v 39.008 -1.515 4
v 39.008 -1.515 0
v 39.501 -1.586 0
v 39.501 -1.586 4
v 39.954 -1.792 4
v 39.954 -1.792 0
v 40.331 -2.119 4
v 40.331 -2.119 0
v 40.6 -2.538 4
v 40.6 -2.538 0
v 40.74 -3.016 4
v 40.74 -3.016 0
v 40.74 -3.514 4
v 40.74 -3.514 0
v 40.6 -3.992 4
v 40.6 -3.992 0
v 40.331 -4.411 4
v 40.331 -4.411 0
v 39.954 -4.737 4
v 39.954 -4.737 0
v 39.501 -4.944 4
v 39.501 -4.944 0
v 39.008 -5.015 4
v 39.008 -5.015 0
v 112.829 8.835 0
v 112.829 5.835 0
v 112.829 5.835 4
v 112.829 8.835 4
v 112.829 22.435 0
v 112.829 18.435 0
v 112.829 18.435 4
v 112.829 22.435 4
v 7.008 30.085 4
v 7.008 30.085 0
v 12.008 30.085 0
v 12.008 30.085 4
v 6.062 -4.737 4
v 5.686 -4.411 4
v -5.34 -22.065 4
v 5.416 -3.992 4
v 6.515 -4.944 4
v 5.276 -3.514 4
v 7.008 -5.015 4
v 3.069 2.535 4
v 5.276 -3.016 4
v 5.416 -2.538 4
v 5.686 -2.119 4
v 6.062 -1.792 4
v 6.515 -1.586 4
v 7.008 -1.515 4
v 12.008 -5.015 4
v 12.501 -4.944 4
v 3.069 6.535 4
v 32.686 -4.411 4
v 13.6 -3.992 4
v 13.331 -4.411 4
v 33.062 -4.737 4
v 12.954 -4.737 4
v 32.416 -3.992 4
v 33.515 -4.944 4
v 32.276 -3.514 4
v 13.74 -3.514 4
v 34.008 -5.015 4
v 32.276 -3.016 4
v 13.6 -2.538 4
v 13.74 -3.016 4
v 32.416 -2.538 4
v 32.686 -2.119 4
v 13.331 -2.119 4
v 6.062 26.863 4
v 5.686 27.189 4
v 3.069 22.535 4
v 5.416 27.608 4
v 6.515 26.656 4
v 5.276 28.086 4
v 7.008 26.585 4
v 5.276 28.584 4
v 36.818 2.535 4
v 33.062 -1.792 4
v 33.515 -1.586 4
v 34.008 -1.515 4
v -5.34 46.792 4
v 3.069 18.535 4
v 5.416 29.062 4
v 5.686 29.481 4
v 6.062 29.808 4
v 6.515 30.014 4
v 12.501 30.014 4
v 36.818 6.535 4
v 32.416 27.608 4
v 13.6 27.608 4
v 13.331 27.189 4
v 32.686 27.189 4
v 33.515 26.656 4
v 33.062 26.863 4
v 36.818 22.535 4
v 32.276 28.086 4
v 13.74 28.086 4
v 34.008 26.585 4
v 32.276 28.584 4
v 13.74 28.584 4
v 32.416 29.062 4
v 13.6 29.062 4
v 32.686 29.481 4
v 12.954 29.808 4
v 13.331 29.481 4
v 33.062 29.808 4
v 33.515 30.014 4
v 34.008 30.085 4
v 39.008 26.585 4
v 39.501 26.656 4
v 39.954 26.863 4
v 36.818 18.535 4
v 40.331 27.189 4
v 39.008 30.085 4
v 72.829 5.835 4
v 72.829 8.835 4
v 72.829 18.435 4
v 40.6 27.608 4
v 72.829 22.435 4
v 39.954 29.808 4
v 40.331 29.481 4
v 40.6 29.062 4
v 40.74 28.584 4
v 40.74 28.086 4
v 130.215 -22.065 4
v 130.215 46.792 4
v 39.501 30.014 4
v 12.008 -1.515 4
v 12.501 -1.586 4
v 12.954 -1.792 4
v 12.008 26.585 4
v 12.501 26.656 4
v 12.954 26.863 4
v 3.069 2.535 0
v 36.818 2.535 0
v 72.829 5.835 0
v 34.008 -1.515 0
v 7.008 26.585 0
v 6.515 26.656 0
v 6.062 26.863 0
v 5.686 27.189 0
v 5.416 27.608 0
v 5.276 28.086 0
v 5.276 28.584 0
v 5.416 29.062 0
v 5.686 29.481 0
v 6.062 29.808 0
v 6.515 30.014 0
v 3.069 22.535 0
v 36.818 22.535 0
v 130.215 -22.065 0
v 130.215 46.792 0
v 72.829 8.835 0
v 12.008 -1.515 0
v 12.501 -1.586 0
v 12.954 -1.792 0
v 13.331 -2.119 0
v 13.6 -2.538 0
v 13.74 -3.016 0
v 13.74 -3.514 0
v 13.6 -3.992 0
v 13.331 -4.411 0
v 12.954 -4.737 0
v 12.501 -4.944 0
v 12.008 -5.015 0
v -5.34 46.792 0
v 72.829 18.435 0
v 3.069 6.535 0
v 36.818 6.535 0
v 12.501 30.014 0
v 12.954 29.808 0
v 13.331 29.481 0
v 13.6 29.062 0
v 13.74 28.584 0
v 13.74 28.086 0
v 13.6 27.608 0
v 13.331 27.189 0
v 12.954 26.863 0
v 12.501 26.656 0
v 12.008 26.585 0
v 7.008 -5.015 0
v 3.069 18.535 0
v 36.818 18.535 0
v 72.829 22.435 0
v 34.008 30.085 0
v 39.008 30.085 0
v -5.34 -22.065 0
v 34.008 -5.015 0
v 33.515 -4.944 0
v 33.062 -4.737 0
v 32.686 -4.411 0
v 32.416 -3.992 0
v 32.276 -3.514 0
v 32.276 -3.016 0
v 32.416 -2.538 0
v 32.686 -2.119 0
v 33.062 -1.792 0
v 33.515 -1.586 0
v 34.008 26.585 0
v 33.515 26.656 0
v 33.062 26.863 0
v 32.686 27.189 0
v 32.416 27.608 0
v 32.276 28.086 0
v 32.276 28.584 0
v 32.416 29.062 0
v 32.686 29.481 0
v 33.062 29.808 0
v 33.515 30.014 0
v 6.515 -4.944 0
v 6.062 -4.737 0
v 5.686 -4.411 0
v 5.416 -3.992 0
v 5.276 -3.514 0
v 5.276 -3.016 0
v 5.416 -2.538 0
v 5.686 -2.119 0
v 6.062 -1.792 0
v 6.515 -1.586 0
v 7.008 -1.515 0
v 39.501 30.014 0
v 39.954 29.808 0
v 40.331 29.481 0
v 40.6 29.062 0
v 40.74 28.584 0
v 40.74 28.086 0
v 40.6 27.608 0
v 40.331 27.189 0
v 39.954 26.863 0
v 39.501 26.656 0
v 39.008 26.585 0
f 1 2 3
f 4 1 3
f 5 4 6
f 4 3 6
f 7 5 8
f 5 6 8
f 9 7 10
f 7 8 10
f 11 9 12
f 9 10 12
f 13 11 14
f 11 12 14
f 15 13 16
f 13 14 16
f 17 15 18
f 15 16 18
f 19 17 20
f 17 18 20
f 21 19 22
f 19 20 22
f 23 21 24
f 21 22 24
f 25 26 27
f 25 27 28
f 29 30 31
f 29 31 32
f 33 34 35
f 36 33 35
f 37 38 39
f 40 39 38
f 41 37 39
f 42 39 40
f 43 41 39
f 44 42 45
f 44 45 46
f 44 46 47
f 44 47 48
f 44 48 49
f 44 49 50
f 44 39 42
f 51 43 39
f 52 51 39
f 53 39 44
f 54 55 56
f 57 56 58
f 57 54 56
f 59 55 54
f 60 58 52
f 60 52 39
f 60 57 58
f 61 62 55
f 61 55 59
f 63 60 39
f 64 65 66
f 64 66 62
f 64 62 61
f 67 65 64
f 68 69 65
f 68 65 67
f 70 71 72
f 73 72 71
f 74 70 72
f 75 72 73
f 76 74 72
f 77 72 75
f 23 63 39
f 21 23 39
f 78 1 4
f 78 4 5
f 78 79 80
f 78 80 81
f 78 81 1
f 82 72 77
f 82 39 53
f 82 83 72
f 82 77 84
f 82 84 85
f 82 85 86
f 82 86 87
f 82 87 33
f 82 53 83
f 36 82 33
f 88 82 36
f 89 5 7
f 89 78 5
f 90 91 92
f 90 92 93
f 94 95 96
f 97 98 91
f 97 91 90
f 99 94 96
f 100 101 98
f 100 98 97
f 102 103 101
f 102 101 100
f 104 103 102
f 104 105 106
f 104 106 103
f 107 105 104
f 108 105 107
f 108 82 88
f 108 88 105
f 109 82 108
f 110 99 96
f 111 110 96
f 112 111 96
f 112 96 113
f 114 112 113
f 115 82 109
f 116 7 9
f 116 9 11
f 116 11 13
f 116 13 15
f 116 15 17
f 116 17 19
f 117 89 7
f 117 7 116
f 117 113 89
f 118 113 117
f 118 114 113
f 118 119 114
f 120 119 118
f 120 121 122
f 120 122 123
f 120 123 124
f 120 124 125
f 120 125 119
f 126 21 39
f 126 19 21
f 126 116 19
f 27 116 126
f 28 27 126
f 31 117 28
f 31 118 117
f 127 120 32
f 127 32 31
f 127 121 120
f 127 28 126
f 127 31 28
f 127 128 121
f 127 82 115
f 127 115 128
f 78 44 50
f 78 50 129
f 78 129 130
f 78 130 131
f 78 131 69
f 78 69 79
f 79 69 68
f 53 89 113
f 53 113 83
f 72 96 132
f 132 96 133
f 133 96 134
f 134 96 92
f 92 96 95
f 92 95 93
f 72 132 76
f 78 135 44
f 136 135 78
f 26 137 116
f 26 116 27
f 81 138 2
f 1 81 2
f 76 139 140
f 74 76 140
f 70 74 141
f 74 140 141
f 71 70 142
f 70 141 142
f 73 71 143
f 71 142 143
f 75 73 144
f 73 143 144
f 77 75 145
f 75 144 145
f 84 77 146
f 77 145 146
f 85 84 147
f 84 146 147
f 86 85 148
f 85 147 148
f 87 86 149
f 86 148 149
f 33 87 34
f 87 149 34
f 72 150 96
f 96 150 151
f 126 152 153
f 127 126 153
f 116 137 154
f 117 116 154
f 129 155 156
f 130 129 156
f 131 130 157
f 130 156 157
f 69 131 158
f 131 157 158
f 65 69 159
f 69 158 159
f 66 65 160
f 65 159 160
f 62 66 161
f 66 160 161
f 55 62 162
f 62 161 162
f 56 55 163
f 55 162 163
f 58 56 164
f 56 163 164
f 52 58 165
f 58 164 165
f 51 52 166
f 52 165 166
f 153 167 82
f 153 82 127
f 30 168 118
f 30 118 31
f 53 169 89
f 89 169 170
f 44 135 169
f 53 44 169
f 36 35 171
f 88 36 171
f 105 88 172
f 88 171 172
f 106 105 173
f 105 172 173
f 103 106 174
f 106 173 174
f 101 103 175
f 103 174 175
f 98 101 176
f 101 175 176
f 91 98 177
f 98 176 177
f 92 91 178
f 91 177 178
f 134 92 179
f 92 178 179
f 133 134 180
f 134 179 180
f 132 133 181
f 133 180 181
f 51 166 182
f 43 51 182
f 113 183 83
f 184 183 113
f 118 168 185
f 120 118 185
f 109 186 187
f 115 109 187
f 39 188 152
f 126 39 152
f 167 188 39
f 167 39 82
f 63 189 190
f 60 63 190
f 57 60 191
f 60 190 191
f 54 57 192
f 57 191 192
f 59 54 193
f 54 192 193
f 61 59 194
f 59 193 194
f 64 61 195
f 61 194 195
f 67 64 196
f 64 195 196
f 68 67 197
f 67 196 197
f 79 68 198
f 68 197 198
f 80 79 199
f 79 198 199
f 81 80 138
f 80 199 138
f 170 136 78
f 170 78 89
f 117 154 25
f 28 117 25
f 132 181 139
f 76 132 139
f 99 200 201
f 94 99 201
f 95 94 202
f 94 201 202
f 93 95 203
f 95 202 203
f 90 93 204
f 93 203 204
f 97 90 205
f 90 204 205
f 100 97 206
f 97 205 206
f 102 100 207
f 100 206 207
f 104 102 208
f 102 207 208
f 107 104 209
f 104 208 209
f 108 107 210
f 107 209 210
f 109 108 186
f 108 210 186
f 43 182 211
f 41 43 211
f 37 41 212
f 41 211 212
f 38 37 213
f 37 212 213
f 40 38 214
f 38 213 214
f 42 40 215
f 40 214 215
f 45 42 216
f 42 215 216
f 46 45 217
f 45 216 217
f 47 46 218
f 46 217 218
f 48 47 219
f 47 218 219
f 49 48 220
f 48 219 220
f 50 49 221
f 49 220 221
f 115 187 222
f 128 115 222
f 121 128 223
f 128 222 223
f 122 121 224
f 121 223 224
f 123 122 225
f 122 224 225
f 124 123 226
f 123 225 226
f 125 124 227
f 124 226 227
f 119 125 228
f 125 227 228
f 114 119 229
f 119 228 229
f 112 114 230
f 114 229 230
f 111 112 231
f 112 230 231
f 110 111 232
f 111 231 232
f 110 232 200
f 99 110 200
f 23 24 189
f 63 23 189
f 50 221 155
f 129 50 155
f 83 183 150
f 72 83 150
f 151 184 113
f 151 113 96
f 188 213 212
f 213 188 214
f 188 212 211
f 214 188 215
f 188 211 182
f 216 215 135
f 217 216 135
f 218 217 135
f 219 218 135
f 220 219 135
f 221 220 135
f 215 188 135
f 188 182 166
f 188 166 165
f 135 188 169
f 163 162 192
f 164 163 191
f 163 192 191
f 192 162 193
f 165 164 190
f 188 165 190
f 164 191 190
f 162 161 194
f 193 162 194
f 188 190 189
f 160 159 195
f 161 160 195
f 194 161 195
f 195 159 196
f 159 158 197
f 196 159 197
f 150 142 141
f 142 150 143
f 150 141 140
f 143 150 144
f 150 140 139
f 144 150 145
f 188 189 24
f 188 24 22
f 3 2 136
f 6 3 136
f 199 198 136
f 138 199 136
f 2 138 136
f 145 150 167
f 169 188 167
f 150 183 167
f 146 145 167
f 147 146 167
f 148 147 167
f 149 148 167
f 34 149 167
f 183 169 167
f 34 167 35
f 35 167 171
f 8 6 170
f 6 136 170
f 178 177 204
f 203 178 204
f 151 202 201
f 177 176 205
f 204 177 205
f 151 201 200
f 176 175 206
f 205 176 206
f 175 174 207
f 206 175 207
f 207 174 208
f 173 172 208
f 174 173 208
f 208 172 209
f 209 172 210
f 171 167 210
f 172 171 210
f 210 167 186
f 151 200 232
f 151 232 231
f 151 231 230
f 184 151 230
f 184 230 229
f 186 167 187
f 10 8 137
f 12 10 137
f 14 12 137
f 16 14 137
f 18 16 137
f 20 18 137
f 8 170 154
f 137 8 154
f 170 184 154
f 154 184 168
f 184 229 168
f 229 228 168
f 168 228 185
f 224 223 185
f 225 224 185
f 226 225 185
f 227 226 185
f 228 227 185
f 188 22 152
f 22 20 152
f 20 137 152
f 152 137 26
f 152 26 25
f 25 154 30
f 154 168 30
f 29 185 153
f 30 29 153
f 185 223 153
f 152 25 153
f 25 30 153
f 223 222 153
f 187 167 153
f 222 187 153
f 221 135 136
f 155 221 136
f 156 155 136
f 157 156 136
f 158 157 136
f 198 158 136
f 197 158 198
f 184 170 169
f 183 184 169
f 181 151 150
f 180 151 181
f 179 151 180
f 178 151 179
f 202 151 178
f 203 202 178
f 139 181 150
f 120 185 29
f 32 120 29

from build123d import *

# Parameters (mm, degrees)
SKETCH_1_W      = 135.554325902
SKETCH_1_H      = 68.857107744
SKETCH_1_W_2    = 33.748913088
SKETCH_1_H_2    = 4
SKETCH_1_W_3    = 40
SKETCH_1_H_3    = 3
EXTRUDE_1_DEPTH = 4


with BuildPart() as part:
    # 草图1 → 凸台-拉伸1 (new body)
    with BuildSketch(Plane.XY):
        with Locations((62.437378831, 12.363507084)):
            Rectangle(SKETCH_1_W, SKETCH_1_H)
        with BuildLine():
            Line((7.008200879, 30.085320336), (12.008200879, 30.085320336))
            ThreePointArc((12.008200879, 30.085320336), (13.758200879, 28.335320336), (12.008200879, 26.585320336))
            Line((12.008200879, 26.585320336), (7.008200879, 26.585320336))
            ThreePointArc((7.008200879, 26.585320336), (5.258200879, 28.335320336), (7.008200879, 30.085320336))
        make_face(mode=Mode.SUBTRACT)
        with BuildLine():
            Line((39.008200879, 26.585320336), (34.008200879, 26.585320336))
            ThreePointArc((34.008200879, 26.585320336), (32.258200879, 28.335320336), (34.008200879, 30.085320336))
            Line((34.008200879, 30.085320336), (39.008200879, 30.085320336))
            ThreePointArc((39.008200879, 30.085320336), (40.758200879, 28.335320336), (39.008200879, 26.585320336))
        make_face(mode=Mode.SUBTRACT)
        with BuildLine():
            Line((7.008200879, -1.514679664), (12.008200879, -1.514679664))
            ThreePointArc((12.008200879, -1.514679664), (13.758200879, -3.264679664), (12.008200879, -5.014679664))
            Line((12.008200879, -5.014679664), (7.008200879, -5.014679664))
            ThreePointArc((7.008200879, -5.014679664), (5.258200879, -3.264679664), (7.008200879, -1.514679664))
        make_face(mode=Mode.SUBTRACT)
        with Locations((19.943744335, 20.535320336)):
            Rectangle(SKETCH_1_W_2, SKETCH_1_H_2, mode=Mode.SUBTRACT)
        with BuildLine():
            Line((39.008200879, -5.014679664), (34.008200879, -5.014679664))
            ThreePointArc((34.008200879, -5.014679664), (32.258200879, -3.264679664), (34.008200879, -1.514679664))
            Line((34.008200879, -1.514679664), (39.008200879, -1.514679664))
            ThreePointArc((39.008200879, -1.514679664), (40.758200879, -3.264679664), (39.008200879, -5.014679664))
        make_face(mode=Mode.SUBTRACT)
        with Locations((19.943744335, 4.535320336)):
            Rectangle(SKETCH_1_W_2, SKETCH_1_H_2, mode=Mode.SUBTRACT)
        with Locations((92.829401098, 20.435320336)):
            Rectangle(SKETCH_1_W_3, SKETCH_1_H_2, mode=Mode.SUBTRACT)
        with Locations((92.829401098, 7.335320336)):
            Rectangle(SKETCH_1_W_3, SKETCH_1_H_3, mode=Mode.SUBTRACT)
    extrude(amount=EXTRUDE_1_DEPTH)


solid = part.part
